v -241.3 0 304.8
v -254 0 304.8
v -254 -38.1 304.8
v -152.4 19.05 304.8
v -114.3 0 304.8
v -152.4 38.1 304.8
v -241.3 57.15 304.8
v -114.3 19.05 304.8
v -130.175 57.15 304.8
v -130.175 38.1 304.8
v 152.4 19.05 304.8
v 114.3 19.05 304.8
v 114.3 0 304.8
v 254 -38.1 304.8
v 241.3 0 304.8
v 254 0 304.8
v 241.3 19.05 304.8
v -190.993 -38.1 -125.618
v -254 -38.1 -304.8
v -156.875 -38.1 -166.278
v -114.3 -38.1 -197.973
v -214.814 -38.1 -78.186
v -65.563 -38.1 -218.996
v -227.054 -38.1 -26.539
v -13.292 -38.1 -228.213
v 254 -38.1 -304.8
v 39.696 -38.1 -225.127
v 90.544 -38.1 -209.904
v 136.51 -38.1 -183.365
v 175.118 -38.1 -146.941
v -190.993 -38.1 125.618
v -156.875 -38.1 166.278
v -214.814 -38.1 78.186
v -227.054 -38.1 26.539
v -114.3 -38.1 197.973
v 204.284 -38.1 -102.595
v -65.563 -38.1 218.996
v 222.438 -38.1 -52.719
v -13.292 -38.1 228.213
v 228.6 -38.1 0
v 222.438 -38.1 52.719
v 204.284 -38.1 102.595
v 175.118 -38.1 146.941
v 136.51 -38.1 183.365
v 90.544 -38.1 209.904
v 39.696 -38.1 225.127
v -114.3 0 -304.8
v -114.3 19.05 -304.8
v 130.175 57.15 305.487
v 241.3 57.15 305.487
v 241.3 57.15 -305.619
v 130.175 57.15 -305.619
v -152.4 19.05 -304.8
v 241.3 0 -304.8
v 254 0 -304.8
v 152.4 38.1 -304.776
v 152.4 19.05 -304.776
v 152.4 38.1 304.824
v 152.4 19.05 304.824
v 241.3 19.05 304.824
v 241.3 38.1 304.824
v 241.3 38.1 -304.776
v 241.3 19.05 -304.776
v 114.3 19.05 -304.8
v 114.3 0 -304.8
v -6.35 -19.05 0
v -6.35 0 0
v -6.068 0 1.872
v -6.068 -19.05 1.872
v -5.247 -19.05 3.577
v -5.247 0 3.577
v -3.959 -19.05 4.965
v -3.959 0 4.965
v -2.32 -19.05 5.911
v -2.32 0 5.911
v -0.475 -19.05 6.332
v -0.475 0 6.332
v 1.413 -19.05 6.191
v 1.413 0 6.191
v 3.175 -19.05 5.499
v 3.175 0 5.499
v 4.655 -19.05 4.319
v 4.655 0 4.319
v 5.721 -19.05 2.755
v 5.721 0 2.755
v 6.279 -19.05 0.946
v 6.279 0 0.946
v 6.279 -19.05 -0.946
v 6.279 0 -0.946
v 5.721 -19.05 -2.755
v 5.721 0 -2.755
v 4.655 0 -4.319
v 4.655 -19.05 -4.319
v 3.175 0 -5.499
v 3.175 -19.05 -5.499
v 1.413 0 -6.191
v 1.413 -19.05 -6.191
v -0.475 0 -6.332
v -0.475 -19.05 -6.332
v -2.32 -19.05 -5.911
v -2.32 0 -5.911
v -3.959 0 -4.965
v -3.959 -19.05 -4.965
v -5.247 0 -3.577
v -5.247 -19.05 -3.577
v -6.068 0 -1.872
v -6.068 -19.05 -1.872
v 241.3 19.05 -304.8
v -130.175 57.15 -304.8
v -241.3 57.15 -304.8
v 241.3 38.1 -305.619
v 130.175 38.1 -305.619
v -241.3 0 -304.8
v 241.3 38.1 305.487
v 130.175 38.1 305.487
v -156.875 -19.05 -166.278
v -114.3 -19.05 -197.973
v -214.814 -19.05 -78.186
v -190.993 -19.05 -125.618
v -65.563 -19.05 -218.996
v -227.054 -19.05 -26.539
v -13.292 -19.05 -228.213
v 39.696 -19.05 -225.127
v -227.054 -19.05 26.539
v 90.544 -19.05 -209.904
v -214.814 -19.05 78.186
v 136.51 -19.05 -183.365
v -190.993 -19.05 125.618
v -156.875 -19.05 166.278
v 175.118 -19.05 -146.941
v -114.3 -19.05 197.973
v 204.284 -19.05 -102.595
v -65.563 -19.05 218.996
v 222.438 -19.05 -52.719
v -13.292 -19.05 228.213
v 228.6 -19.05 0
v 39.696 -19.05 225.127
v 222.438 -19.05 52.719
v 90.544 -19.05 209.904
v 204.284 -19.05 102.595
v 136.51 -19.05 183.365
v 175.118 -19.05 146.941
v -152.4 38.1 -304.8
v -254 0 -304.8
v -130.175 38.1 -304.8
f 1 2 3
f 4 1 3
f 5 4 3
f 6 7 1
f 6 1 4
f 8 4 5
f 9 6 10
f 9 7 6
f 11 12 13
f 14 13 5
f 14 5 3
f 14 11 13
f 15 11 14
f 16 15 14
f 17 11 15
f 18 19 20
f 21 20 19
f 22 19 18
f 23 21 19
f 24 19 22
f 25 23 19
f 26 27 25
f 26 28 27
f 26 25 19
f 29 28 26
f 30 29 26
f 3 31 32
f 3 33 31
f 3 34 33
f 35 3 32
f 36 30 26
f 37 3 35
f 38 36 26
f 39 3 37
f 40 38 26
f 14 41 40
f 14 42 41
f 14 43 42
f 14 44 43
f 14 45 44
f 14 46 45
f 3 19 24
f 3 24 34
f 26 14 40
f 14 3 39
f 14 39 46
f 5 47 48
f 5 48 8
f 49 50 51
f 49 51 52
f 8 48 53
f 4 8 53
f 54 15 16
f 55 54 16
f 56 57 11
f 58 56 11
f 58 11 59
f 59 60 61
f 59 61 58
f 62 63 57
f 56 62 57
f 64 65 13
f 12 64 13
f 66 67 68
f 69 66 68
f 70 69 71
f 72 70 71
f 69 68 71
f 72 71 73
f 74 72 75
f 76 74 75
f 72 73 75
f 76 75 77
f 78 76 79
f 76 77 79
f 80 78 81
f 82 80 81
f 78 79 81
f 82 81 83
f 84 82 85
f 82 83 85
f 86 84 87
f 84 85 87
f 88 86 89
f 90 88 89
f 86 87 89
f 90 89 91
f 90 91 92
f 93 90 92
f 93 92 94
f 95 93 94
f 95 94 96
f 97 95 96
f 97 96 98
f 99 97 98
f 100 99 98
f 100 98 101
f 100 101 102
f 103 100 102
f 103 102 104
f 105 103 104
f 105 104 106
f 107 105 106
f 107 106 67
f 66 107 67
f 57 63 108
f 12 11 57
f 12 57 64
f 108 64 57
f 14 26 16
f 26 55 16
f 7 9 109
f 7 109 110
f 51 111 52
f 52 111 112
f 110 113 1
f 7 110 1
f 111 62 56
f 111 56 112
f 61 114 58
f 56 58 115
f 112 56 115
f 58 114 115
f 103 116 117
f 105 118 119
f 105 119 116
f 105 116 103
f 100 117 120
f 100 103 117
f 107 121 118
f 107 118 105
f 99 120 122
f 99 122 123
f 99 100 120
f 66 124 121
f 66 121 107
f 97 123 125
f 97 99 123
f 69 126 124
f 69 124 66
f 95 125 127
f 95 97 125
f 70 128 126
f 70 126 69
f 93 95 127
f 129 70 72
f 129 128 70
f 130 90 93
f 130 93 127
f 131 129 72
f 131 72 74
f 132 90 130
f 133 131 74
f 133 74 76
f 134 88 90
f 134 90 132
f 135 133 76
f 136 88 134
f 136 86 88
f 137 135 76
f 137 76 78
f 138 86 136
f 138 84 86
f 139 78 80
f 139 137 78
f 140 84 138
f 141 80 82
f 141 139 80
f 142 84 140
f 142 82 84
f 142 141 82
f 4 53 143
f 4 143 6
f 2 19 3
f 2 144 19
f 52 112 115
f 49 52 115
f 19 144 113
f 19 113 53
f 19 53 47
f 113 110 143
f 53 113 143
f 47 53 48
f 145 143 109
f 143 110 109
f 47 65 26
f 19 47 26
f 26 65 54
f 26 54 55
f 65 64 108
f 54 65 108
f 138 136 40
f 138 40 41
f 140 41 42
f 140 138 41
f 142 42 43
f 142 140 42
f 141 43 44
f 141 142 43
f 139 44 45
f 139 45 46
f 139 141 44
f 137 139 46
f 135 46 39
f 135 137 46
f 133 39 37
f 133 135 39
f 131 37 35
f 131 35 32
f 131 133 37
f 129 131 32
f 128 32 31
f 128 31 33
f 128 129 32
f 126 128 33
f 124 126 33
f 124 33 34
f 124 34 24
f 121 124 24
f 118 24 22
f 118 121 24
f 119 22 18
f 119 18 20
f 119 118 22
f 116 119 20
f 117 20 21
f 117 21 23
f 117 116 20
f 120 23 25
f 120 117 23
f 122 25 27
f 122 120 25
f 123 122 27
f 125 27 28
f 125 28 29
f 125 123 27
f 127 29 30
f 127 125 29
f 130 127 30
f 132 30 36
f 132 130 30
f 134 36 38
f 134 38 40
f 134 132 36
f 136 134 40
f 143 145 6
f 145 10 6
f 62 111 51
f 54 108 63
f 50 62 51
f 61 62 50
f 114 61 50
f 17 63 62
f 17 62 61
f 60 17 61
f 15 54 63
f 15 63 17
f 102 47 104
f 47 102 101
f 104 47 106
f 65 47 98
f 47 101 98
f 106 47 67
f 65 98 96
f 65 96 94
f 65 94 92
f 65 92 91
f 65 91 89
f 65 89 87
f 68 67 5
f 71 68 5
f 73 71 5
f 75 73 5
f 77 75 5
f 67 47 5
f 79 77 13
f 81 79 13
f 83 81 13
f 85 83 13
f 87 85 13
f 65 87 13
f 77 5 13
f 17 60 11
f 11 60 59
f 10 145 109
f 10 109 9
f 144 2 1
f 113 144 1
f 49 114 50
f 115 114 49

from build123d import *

# Parameters (mm, degrees)
F0_W     = 508
F0_H     = 609.6
F1_DEPTH = 19.05
F2_W     = 127
F2_H     = 609.6
F3_DEPTH = 19.05
F4_W     = 88.9
F4_H     = 609.6
F5_DEPTH = 19.05
F6_W     = 88.9
F6_H     = 609.6
F6_W_2   = 22.225
F6_W_3   = 111.125
F6_H_2   = 611.105501
F7_DEPTH = 19.05
F8_W     = 508
F8_H     = 609.6
F8_R     = 228.6
F9_DEPTH = 19.05
F10_D    = 12.7


with BuildPart() as f1:
    # F0 (on Front) → F1 (new body)
    with BuildSketch(Plane.XZ):
        Rectangle(F0_W, F0_H)
    extrude(amount=F1_DEPTH)

    # F2 (on face) → F3 (join)
    with BuildSketch(Plane(origin=(0, 0, 0), x_dir=(-1, 0, 0), z_dir=(0, 1, 0))):
        with Locations((177.8, 0)):
            Rectangle(F2_W, F2_H)
        with Locations((-177.8, 0)):
            Rectangle(F2_W, F2_H)
    extrude(amount=F3_DEPTH)

    # F4 (on face) → F5 (join)
    with BuildSketch(Plane(origin=(0, 19.05, 0), x_dir=(-1, 0, 0), z_dir=(0, 1, 0))):
        with Locations((196.85, 0)):
            Rectangle(F4_W, F4_H)
        with Locations((-196.85, 0.023927)):
            Rectangle(F4_W, F4_H)
    extrude(amount=F5_DEPTH)

    # F6 (on face) → F7 (join)
    with BuildSketch(Plane(origin=(0, 38.1, 0), x_dir=(-1, 0, 0), z_dir=(0, 1, 0))):
        with Locations((196.85, 0)):
            Rectangle(F6_W, F6_H)
        with Locations((141.2875, 0)):
            Rectangle(F6_W_2, F6_H)
        with Locations((-185.7375, -0.065833)):
            Rectangle(F6_W_3, F6_H_2)
    extrude(amount=F7_DEPTH)

    # F8 (on face) → F9 (join)
    with BuildSketch(Plane.XZ.offset(19.05)):
        Rectangle(F8_W, F8_H)
        Circle(F8_R, mode=Mode.SUBTRACT)
    extrude(amount=F9_DEPTH)

    # F10 (through all)
    with Locations(Plane.XZ.offset(19.05)):
        with Locations((0, 0)):
            Hole(F10_D / 2)


solid = f1.part
